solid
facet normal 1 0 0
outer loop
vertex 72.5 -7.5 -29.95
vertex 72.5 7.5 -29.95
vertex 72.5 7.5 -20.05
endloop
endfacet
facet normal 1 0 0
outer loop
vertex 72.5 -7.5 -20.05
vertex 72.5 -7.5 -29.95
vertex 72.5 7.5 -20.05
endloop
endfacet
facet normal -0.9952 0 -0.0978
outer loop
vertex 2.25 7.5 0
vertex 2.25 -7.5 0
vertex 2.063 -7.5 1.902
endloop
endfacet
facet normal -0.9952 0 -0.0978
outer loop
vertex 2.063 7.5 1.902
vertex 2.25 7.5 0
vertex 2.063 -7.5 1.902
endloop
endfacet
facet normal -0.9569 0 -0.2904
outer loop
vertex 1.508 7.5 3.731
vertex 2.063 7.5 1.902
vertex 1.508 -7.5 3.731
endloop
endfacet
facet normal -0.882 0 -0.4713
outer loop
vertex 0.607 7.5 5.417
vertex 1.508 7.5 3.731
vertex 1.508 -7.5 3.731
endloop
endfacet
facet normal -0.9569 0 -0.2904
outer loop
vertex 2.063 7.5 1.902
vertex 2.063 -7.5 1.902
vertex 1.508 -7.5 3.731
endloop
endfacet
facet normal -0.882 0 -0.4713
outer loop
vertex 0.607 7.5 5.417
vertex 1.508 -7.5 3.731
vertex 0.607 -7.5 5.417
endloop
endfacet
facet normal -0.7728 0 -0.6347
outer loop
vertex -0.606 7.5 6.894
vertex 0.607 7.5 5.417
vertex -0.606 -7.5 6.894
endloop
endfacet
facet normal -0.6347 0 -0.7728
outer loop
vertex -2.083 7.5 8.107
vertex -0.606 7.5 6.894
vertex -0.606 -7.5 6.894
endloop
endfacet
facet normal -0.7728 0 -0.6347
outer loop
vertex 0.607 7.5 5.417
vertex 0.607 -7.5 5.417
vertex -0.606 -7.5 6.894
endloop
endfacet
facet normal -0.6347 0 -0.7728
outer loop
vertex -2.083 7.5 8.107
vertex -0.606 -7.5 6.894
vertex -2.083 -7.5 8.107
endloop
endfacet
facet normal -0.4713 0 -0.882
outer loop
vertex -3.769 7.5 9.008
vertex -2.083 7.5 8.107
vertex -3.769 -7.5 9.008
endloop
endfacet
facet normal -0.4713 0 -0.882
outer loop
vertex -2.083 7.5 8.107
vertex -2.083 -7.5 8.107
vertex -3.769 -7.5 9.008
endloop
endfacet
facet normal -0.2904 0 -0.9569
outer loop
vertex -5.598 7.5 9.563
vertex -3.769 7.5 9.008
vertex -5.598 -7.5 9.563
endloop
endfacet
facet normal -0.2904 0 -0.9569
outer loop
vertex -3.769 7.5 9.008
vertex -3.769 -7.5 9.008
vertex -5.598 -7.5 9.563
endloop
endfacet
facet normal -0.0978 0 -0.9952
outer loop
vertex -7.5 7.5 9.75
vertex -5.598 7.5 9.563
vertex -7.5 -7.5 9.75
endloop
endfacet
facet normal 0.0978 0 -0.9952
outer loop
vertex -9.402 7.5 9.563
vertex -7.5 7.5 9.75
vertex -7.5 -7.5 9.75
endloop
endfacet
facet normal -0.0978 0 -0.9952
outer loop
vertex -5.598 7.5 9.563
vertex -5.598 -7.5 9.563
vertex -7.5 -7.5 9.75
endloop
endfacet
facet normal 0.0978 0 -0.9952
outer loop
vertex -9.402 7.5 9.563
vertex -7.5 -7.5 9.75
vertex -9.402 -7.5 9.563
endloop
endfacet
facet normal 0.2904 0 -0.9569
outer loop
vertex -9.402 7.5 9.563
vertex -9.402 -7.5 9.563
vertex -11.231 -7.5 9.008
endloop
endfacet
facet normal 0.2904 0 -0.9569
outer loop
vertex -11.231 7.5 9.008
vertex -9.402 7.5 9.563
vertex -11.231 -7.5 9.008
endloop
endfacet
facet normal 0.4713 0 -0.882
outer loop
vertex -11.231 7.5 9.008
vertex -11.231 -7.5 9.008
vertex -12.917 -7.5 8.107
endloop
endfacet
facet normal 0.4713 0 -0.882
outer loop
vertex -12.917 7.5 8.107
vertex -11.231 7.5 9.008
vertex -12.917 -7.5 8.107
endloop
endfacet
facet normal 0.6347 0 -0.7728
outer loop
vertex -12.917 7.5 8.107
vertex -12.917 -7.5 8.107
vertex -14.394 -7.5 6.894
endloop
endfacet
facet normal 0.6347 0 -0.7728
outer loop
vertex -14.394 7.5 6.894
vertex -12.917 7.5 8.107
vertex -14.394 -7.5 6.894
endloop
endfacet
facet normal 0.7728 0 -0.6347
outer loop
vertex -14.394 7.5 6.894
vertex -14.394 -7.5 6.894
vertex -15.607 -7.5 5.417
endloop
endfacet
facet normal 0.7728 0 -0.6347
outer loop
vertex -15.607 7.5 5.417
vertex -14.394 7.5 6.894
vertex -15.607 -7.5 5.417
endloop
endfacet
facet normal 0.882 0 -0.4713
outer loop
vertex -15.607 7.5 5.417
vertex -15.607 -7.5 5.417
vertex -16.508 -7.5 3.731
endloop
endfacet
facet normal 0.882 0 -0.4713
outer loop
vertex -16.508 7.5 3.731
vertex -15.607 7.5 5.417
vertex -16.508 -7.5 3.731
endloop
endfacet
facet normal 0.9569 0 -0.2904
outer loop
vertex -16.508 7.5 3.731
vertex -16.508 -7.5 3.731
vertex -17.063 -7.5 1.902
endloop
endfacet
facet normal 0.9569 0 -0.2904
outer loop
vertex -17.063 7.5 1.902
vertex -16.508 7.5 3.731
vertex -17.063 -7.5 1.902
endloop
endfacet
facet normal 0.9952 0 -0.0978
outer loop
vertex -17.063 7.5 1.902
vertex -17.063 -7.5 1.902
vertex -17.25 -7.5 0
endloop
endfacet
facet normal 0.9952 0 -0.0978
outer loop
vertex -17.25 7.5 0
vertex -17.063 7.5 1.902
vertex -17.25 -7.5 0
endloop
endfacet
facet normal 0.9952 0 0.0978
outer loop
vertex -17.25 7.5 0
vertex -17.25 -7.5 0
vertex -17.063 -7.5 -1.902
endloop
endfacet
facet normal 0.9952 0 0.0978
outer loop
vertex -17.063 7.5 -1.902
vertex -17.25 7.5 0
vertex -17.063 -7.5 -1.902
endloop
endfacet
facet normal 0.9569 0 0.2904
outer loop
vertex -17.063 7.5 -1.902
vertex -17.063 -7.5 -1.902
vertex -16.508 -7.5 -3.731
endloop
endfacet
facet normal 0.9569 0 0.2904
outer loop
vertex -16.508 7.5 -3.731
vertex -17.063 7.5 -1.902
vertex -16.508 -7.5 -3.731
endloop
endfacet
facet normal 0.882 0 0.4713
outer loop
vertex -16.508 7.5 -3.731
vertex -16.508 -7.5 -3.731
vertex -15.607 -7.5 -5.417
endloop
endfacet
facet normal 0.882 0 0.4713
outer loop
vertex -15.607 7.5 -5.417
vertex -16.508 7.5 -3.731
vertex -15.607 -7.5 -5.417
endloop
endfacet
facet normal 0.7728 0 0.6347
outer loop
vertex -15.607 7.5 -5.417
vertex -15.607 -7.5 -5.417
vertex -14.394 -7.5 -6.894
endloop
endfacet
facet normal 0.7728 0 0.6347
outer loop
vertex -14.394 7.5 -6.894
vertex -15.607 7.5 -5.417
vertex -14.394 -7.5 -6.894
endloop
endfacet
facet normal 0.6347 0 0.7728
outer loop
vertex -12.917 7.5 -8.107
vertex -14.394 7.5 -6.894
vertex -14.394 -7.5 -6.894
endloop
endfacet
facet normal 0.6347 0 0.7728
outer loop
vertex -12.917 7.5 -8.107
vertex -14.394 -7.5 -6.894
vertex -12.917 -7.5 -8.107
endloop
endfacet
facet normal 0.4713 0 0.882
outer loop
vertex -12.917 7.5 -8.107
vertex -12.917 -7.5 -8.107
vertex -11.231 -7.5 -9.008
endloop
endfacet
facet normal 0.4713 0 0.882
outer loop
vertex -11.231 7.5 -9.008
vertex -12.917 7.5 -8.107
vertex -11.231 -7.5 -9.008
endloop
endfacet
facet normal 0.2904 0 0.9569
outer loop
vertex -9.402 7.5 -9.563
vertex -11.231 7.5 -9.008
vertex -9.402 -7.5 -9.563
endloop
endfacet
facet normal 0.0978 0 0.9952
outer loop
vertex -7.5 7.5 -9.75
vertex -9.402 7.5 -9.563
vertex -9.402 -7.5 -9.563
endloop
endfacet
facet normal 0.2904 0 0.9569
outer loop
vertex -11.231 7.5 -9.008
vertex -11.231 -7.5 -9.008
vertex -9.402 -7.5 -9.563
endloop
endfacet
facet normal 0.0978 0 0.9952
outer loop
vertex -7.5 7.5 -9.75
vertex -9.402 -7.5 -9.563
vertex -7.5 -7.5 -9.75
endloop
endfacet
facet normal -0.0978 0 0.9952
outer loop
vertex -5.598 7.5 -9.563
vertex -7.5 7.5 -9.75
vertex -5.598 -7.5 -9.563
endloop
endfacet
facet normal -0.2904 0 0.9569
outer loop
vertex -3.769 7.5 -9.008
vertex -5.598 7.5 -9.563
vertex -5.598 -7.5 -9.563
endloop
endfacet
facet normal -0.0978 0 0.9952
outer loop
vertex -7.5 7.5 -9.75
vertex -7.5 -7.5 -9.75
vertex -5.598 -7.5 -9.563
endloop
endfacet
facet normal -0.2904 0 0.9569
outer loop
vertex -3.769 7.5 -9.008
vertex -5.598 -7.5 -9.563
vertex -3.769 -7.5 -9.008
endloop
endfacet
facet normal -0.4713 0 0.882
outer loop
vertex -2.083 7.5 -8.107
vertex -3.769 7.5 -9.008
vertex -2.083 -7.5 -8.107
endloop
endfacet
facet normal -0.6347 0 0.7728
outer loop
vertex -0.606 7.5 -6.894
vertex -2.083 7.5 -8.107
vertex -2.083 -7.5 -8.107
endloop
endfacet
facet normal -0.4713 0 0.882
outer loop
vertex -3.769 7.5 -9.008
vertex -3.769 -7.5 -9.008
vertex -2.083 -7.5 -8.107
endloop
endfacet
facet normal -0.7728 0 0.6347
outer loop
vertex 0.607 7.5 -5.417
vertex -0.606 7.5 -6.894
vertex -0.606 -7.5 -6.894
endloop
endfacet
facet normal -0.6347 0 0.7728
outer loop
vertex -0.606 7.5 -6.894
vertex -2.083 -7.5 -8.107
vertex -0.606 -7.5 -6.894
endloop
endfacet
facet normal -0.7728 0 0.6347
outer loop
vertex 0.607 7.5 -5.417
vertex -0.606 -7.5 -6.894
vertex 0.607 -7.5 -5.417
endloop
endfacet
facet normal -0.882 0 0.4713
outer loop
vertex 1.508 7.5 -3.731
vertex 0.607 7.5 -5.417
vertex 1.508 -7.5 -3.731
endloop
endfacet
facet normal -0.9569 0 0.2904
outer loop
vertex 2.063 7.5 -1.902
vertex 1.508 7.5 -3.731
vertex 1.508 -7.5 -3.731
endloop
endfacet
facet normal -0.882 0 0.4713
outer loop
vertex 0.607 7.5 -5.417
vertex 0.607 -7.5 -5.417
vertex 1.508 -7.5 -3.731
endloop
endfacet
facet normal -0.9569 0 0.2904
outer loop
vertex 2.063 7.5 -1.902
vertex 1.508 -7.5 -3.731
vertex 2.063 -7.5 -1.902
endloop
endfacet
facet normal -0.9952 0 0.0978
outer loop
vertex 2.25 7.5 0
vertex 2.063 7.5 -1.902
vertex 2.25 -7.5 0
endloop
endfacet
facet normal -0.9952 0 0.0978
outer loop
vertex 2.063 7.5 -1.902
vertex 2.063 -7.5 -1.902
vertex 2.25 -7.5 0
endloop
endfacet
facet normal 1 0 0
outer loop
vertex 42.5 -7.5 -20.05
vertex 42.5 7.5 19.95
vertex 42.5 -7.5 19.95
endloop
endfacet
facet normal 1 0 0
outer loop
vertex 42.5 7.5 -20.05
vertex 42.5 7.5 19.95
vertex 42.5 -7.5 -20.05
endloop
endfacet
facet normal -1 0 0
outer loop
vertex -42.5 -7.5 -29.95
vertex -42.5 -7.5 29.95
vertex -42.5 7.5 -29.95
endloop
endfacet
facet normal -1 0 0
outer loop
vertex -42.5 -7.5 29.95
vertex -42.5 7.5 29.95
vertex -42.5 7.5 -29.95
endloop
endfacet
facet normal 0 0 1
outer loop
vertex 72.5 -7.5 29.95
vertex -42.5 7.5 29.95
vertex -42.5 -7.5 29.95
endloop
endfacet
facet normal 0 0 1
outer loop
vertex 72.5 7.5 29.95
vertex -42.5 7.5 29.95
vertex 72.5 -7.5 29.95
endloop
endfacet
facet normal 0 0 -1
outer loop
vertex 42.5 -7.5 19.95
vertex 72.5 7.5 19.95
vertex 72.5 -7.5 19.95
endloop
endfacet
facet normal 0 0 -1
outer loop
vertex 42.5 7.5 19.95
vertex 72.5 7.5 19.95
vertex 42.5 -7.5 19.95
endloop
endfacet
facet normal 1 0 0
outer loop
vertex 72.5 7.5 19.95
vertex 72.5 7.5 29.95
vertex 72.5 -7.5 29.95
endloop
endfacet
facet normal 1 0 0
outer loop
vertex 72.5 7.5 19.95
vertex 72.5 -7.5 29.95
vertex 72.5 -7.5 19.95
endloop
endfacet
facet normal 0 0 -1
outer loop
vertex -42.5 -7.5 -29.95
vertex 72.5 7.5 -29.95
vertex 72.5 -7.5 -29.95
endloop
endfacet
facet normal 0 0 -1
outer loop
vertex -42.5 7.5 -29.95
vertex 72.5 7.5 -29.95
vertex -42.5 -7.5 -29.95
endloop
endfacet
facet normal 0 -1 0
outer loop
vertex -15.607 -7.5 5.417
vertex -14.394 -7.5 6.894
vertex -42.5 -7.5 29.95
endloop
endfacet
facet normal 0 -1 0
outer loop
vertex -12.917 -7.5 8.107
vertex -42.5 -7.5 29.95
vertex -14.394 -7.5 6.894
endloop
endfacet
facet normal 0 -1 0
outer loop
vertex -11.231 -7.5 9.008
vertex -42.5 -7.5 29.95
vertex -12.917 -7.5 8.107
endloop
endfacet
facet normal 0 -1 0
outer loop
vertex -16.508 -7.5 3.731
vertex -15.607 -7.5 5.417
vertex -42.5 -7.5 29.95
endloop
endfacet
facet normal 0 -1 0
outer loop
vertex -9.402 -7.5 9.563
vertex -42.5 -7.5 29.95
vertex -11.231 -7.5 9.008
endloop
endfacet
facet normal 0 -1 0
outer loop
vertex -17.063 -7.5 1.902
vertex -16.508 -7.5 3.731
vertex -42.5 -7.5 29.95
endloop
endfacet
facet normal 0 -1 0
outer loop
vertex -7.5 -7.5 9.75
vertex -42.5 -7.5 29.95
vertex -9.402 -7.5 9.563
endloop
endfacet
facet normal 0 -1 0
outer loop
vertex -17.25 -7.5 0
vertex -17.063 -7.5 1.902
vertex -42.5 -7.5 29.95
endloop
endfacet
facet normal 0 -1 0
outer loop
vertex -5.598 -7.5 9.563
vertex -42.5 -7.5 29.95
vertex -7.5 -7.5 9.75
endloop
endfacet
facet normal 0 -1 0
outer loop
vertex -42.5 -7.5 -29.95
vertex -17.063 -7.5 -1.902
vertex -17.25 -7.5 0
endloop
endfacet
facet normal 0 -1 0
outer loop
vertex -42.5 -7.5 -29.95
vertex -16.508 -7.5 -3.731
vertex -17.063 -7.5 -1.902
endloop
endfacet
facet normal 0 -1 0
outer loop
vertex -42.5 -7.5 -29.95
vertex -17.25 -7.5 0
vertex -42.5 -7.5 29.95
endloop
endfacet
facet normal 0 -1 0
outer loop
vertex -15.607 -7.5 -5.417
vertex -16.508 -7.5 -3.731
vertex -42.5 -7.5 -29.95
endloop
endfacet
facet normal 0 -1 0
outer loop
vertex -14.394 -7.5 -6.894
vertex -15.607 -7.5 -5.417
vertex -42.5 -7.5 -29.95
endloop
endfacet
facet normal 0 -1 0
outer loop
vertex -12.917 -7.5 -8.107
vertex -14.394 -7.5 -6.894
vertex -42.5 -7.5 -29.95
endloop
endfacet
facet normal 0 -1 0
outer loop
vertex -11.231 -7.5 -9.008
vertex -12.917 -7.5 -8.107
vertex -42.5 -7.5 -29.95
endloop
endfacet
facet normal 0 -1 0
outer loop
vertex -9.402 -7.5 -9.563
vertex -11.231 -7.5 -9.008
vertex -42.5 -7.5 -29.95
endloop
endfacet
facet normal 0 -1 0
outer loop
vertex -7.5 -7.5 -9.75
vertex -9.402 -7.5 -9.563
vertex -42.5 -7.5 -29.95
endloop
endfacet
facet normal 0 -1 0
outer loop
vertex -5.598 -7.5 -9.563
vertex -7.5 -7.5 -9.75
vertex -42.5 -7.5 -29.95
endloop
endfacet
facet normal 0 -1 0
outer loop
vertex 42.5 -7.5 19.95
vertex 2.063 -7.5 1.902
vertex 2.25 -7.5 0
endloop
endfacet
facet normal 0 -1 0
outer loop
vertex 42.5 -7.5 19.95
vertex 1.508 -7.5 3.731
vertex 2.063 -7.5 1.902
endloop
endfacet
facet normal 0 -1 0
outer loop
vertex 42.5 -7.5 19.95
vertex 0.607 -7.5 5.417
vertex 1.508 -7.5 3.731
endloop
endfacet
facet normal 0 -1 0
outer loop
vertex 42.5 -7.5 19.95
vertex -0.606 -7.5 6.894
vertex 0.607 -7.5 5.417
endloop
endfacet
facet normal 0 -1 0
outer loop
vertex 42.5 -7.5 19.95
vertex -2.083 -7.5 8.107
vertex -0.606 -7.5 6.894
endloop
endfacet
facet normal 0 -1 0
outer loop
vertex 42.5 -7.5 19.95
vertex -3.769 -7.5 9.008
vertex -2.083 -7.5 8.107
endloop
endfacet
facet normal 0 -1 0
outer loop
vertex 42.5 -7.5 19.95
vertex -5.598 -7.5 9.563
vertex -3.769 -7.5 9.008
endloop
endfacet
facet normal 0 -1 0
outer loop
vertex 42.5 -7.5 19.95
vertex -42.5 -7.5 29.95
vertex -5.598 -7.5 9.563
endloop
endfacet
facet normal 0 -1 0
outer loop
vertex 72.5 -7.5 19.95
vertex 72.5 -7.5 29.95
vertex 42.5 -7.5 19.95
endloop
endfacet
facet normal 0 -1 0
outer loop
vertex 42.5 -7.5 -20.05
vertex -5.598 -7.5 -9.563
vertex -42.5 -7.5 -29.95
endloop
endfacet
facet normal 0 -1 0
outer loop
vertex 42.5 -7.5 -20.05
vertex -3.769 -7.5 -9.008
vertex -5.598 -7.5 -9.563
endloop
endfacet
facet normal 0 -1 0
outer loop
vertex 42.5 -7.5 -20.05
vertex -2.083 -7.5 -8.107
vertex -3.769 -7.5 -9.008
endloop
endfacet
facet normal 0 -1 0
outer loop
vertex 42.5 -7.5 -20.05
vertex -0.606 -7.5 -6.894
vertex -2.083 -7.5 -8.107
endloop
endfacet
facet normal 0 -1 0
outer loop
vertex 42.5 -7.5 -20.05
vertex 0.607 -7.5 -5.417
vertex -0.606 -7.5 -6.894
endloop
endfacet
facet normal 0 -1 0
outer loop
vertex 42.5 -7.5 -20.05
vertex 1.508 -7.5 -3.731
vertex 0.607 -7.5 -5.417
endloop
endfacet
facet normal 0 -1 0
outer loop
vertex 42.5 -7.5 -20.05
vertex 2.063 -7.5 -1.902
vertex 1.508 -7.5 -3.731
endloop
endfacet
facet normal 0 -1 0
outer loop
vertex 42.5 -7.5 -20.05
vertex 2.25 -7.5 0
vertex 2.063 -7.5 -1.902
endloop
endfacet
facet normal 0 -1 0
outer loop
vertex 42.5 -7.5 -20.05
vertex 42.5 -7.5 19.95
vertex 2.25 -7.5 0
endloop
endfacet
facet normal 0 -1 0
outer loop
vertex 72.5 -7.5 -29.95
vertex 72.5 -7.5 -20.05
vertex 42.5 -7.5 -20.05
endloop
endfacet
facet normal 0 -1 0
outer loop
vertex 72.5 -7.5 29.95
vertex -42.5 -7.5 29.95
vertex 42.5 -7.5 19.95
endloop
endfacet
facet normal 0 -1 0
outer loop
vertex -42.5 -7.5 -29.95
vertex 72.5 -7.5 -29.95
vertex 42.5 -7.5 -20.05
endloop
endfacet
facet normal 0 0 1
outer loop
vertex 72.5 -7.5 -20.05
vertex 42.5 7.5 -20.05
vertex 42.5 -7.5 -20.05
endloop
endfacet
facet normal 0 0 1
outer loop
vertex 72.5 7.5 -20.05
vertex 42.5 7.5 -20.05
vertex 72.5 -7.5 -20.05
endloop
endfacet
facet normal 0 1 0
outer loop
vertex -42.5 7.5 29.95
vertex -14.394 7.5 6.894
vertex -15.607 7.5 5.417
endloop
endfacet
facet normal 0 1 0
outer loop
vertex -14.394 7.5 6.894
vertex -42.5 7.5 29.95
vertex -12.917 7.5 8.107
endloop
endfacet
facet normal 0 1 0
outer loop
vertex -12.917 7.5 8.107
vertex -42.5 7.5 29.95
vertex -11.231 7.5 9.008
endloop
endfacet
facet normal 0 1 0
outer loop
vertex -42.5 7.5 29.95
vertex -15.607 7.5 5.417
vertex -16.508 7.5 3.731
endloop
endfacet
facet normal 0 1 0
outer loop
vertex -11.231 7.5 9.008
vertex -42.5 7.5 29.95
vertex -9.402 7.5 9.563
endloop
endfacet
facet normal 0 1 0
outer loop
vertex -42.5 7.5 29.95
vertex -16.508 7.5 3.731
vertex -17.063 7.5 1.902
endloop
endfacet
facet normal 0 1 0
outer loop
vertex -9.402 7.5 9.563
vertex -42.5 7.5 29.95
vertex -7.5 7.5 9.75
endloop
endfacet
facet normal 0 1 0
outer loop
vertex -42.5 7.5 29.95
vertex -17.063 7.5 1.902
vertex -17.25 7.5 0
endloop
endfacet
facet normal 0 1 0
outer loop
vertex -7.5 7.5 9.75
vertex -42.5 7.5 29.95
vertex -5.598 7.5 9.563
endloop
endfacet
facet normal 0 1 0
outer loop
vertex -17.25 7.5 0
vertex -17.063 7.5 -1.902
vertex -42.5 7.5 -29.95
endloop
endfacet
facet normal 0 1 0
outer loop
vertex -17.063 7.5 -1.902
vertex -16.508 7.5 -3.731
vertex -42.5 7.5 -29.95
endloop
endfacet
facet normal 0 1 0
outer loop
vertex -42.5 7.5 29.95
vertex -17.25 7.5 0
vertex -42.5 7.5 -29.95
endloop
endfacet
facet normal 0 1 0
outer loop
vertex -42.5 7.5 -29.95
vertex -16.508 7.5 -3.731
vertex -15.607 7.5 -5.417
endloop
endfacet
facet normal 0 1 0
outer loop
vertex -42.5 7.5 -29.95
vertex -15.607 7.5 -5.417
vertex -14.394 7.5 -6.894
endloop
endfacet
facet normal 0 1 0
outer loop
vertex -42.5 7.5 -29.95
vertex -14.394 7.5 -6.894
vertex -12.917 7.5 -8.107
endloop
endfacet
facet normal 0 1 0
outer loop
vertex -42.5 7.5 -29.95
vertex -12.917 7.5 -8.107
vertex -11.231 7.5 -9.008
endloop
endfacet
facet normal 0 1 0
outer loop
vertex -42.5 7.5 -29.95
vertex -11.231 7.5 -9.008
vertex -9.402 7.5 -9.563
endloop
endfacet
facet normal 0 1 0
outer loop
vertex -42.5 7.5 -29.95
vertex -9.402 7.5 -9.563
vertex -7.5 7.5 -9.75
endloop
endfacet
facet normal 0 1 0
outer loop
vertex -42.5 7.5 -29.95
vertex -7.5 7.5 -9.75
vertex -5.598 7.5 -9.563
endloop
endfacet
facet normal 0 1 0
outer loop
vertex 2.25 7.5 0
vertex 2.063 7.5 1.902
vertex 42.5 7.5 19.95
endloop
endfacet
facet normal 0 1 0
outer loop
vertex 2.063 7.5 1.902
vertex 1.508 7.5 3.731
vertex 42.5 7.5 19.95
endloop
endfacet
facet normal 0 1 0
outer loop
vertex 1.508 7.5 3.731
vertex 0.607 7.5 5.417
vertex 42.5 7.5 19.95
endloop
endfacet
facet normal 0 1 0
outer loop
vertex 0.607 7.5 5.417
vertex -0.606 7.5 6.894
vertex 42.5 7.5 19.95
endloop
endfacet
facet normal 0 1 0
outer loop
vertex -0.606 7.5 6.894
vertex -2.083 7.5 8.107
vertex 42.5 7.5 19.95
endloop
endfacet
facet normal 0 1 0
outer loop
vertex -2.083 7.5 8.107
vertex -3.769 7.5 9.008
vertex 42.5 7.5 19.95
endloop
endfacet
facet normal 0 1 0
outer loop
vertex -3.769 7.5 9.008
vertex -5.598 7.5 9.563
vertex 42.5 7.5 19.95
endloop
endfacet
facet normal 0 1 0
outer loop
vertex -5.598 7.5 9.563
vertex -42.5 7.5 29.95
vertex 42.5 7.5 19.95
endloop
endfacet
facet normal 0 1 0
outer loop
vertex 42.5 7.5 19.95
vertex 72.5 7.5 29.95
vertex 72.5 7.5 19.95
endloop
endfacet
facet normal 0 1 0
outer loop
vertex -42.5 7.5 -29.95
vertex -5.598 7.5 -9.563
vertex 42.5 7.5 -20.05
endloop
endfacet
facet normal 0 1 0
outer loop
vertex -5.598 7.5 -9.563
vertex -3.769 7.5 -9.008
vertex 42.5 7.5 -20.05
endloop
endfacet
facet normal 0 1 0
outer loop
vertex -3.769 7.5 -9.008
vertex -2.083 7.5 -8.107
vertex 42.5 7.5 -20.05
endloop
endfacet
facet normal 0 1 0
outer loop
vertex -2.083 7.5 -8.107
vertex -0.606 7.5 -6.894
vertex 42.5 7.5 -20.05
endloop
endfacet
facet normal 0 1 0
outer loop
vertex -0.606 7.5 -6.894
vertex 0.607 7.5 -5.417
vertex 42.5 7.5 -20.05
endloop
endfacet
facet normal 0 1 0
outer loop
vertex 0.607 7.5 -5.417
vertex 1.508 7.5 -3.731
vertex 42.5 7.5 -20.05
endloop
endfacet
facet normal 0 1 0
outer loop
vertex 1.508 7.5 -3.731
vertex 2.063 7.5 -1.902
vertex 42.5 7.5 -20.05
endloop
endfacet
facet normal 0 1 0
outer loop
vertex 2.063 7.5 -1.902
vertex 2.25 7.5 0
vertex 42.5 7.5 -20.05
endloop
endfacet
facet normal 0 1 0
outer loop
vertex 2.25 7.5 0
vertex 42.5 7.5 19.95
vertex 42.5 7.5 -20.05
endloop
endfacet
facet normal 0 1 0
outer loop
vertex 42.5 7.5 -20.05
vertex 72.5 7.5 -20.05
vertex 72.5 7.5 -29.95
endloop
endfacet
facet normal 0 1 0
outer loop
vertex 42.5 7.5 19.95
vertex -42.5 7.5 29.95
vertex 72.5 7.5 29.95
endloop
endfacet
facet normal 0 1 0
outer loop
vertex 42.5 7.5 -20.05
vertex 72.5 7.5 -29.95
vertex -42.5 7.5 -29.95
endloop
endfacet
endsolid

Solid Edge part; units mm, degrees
sketch "Sketch1" plane through (0, 0, 0) normal (0, -1, 0) x (1, 0, 0)
  line L0 (-42.5, 29.95) -> (-42.5, -29.95)
  line L1 (72.5, -29.95) -> (-42.5, -29.95)
  line L2 (72.5, -29.95) -> (72.5, -20.05)
  line L3 (42.5, -20.05) -> (72.5, -20.05)
  line L4 (42.5, 19.95) -> (42.5, -20.05)
  line L5 (72.5, 19.95) -> (42.5, 19.95)
  line L6 (72.5, 29.95) -> (72.5, 19.95)
  line L7 (-42.5, 29.95) -> (72.5, 29.95)
  dimension "D1" = 59.9
extrude "Protrusion1" add sketch "Sketch1" along normal mid plane 15
sketch "Sketch2" plane through (0, -7.5, 0) normal (0, -1, 0) x (1, 0, 0)
  circle A0 centre (-7.5, 0) radius 9.75
  dimension "D1" = 35
extrude "Ausschnitt_1" cut sketch "Sketch2" against normal blind 113.5793
